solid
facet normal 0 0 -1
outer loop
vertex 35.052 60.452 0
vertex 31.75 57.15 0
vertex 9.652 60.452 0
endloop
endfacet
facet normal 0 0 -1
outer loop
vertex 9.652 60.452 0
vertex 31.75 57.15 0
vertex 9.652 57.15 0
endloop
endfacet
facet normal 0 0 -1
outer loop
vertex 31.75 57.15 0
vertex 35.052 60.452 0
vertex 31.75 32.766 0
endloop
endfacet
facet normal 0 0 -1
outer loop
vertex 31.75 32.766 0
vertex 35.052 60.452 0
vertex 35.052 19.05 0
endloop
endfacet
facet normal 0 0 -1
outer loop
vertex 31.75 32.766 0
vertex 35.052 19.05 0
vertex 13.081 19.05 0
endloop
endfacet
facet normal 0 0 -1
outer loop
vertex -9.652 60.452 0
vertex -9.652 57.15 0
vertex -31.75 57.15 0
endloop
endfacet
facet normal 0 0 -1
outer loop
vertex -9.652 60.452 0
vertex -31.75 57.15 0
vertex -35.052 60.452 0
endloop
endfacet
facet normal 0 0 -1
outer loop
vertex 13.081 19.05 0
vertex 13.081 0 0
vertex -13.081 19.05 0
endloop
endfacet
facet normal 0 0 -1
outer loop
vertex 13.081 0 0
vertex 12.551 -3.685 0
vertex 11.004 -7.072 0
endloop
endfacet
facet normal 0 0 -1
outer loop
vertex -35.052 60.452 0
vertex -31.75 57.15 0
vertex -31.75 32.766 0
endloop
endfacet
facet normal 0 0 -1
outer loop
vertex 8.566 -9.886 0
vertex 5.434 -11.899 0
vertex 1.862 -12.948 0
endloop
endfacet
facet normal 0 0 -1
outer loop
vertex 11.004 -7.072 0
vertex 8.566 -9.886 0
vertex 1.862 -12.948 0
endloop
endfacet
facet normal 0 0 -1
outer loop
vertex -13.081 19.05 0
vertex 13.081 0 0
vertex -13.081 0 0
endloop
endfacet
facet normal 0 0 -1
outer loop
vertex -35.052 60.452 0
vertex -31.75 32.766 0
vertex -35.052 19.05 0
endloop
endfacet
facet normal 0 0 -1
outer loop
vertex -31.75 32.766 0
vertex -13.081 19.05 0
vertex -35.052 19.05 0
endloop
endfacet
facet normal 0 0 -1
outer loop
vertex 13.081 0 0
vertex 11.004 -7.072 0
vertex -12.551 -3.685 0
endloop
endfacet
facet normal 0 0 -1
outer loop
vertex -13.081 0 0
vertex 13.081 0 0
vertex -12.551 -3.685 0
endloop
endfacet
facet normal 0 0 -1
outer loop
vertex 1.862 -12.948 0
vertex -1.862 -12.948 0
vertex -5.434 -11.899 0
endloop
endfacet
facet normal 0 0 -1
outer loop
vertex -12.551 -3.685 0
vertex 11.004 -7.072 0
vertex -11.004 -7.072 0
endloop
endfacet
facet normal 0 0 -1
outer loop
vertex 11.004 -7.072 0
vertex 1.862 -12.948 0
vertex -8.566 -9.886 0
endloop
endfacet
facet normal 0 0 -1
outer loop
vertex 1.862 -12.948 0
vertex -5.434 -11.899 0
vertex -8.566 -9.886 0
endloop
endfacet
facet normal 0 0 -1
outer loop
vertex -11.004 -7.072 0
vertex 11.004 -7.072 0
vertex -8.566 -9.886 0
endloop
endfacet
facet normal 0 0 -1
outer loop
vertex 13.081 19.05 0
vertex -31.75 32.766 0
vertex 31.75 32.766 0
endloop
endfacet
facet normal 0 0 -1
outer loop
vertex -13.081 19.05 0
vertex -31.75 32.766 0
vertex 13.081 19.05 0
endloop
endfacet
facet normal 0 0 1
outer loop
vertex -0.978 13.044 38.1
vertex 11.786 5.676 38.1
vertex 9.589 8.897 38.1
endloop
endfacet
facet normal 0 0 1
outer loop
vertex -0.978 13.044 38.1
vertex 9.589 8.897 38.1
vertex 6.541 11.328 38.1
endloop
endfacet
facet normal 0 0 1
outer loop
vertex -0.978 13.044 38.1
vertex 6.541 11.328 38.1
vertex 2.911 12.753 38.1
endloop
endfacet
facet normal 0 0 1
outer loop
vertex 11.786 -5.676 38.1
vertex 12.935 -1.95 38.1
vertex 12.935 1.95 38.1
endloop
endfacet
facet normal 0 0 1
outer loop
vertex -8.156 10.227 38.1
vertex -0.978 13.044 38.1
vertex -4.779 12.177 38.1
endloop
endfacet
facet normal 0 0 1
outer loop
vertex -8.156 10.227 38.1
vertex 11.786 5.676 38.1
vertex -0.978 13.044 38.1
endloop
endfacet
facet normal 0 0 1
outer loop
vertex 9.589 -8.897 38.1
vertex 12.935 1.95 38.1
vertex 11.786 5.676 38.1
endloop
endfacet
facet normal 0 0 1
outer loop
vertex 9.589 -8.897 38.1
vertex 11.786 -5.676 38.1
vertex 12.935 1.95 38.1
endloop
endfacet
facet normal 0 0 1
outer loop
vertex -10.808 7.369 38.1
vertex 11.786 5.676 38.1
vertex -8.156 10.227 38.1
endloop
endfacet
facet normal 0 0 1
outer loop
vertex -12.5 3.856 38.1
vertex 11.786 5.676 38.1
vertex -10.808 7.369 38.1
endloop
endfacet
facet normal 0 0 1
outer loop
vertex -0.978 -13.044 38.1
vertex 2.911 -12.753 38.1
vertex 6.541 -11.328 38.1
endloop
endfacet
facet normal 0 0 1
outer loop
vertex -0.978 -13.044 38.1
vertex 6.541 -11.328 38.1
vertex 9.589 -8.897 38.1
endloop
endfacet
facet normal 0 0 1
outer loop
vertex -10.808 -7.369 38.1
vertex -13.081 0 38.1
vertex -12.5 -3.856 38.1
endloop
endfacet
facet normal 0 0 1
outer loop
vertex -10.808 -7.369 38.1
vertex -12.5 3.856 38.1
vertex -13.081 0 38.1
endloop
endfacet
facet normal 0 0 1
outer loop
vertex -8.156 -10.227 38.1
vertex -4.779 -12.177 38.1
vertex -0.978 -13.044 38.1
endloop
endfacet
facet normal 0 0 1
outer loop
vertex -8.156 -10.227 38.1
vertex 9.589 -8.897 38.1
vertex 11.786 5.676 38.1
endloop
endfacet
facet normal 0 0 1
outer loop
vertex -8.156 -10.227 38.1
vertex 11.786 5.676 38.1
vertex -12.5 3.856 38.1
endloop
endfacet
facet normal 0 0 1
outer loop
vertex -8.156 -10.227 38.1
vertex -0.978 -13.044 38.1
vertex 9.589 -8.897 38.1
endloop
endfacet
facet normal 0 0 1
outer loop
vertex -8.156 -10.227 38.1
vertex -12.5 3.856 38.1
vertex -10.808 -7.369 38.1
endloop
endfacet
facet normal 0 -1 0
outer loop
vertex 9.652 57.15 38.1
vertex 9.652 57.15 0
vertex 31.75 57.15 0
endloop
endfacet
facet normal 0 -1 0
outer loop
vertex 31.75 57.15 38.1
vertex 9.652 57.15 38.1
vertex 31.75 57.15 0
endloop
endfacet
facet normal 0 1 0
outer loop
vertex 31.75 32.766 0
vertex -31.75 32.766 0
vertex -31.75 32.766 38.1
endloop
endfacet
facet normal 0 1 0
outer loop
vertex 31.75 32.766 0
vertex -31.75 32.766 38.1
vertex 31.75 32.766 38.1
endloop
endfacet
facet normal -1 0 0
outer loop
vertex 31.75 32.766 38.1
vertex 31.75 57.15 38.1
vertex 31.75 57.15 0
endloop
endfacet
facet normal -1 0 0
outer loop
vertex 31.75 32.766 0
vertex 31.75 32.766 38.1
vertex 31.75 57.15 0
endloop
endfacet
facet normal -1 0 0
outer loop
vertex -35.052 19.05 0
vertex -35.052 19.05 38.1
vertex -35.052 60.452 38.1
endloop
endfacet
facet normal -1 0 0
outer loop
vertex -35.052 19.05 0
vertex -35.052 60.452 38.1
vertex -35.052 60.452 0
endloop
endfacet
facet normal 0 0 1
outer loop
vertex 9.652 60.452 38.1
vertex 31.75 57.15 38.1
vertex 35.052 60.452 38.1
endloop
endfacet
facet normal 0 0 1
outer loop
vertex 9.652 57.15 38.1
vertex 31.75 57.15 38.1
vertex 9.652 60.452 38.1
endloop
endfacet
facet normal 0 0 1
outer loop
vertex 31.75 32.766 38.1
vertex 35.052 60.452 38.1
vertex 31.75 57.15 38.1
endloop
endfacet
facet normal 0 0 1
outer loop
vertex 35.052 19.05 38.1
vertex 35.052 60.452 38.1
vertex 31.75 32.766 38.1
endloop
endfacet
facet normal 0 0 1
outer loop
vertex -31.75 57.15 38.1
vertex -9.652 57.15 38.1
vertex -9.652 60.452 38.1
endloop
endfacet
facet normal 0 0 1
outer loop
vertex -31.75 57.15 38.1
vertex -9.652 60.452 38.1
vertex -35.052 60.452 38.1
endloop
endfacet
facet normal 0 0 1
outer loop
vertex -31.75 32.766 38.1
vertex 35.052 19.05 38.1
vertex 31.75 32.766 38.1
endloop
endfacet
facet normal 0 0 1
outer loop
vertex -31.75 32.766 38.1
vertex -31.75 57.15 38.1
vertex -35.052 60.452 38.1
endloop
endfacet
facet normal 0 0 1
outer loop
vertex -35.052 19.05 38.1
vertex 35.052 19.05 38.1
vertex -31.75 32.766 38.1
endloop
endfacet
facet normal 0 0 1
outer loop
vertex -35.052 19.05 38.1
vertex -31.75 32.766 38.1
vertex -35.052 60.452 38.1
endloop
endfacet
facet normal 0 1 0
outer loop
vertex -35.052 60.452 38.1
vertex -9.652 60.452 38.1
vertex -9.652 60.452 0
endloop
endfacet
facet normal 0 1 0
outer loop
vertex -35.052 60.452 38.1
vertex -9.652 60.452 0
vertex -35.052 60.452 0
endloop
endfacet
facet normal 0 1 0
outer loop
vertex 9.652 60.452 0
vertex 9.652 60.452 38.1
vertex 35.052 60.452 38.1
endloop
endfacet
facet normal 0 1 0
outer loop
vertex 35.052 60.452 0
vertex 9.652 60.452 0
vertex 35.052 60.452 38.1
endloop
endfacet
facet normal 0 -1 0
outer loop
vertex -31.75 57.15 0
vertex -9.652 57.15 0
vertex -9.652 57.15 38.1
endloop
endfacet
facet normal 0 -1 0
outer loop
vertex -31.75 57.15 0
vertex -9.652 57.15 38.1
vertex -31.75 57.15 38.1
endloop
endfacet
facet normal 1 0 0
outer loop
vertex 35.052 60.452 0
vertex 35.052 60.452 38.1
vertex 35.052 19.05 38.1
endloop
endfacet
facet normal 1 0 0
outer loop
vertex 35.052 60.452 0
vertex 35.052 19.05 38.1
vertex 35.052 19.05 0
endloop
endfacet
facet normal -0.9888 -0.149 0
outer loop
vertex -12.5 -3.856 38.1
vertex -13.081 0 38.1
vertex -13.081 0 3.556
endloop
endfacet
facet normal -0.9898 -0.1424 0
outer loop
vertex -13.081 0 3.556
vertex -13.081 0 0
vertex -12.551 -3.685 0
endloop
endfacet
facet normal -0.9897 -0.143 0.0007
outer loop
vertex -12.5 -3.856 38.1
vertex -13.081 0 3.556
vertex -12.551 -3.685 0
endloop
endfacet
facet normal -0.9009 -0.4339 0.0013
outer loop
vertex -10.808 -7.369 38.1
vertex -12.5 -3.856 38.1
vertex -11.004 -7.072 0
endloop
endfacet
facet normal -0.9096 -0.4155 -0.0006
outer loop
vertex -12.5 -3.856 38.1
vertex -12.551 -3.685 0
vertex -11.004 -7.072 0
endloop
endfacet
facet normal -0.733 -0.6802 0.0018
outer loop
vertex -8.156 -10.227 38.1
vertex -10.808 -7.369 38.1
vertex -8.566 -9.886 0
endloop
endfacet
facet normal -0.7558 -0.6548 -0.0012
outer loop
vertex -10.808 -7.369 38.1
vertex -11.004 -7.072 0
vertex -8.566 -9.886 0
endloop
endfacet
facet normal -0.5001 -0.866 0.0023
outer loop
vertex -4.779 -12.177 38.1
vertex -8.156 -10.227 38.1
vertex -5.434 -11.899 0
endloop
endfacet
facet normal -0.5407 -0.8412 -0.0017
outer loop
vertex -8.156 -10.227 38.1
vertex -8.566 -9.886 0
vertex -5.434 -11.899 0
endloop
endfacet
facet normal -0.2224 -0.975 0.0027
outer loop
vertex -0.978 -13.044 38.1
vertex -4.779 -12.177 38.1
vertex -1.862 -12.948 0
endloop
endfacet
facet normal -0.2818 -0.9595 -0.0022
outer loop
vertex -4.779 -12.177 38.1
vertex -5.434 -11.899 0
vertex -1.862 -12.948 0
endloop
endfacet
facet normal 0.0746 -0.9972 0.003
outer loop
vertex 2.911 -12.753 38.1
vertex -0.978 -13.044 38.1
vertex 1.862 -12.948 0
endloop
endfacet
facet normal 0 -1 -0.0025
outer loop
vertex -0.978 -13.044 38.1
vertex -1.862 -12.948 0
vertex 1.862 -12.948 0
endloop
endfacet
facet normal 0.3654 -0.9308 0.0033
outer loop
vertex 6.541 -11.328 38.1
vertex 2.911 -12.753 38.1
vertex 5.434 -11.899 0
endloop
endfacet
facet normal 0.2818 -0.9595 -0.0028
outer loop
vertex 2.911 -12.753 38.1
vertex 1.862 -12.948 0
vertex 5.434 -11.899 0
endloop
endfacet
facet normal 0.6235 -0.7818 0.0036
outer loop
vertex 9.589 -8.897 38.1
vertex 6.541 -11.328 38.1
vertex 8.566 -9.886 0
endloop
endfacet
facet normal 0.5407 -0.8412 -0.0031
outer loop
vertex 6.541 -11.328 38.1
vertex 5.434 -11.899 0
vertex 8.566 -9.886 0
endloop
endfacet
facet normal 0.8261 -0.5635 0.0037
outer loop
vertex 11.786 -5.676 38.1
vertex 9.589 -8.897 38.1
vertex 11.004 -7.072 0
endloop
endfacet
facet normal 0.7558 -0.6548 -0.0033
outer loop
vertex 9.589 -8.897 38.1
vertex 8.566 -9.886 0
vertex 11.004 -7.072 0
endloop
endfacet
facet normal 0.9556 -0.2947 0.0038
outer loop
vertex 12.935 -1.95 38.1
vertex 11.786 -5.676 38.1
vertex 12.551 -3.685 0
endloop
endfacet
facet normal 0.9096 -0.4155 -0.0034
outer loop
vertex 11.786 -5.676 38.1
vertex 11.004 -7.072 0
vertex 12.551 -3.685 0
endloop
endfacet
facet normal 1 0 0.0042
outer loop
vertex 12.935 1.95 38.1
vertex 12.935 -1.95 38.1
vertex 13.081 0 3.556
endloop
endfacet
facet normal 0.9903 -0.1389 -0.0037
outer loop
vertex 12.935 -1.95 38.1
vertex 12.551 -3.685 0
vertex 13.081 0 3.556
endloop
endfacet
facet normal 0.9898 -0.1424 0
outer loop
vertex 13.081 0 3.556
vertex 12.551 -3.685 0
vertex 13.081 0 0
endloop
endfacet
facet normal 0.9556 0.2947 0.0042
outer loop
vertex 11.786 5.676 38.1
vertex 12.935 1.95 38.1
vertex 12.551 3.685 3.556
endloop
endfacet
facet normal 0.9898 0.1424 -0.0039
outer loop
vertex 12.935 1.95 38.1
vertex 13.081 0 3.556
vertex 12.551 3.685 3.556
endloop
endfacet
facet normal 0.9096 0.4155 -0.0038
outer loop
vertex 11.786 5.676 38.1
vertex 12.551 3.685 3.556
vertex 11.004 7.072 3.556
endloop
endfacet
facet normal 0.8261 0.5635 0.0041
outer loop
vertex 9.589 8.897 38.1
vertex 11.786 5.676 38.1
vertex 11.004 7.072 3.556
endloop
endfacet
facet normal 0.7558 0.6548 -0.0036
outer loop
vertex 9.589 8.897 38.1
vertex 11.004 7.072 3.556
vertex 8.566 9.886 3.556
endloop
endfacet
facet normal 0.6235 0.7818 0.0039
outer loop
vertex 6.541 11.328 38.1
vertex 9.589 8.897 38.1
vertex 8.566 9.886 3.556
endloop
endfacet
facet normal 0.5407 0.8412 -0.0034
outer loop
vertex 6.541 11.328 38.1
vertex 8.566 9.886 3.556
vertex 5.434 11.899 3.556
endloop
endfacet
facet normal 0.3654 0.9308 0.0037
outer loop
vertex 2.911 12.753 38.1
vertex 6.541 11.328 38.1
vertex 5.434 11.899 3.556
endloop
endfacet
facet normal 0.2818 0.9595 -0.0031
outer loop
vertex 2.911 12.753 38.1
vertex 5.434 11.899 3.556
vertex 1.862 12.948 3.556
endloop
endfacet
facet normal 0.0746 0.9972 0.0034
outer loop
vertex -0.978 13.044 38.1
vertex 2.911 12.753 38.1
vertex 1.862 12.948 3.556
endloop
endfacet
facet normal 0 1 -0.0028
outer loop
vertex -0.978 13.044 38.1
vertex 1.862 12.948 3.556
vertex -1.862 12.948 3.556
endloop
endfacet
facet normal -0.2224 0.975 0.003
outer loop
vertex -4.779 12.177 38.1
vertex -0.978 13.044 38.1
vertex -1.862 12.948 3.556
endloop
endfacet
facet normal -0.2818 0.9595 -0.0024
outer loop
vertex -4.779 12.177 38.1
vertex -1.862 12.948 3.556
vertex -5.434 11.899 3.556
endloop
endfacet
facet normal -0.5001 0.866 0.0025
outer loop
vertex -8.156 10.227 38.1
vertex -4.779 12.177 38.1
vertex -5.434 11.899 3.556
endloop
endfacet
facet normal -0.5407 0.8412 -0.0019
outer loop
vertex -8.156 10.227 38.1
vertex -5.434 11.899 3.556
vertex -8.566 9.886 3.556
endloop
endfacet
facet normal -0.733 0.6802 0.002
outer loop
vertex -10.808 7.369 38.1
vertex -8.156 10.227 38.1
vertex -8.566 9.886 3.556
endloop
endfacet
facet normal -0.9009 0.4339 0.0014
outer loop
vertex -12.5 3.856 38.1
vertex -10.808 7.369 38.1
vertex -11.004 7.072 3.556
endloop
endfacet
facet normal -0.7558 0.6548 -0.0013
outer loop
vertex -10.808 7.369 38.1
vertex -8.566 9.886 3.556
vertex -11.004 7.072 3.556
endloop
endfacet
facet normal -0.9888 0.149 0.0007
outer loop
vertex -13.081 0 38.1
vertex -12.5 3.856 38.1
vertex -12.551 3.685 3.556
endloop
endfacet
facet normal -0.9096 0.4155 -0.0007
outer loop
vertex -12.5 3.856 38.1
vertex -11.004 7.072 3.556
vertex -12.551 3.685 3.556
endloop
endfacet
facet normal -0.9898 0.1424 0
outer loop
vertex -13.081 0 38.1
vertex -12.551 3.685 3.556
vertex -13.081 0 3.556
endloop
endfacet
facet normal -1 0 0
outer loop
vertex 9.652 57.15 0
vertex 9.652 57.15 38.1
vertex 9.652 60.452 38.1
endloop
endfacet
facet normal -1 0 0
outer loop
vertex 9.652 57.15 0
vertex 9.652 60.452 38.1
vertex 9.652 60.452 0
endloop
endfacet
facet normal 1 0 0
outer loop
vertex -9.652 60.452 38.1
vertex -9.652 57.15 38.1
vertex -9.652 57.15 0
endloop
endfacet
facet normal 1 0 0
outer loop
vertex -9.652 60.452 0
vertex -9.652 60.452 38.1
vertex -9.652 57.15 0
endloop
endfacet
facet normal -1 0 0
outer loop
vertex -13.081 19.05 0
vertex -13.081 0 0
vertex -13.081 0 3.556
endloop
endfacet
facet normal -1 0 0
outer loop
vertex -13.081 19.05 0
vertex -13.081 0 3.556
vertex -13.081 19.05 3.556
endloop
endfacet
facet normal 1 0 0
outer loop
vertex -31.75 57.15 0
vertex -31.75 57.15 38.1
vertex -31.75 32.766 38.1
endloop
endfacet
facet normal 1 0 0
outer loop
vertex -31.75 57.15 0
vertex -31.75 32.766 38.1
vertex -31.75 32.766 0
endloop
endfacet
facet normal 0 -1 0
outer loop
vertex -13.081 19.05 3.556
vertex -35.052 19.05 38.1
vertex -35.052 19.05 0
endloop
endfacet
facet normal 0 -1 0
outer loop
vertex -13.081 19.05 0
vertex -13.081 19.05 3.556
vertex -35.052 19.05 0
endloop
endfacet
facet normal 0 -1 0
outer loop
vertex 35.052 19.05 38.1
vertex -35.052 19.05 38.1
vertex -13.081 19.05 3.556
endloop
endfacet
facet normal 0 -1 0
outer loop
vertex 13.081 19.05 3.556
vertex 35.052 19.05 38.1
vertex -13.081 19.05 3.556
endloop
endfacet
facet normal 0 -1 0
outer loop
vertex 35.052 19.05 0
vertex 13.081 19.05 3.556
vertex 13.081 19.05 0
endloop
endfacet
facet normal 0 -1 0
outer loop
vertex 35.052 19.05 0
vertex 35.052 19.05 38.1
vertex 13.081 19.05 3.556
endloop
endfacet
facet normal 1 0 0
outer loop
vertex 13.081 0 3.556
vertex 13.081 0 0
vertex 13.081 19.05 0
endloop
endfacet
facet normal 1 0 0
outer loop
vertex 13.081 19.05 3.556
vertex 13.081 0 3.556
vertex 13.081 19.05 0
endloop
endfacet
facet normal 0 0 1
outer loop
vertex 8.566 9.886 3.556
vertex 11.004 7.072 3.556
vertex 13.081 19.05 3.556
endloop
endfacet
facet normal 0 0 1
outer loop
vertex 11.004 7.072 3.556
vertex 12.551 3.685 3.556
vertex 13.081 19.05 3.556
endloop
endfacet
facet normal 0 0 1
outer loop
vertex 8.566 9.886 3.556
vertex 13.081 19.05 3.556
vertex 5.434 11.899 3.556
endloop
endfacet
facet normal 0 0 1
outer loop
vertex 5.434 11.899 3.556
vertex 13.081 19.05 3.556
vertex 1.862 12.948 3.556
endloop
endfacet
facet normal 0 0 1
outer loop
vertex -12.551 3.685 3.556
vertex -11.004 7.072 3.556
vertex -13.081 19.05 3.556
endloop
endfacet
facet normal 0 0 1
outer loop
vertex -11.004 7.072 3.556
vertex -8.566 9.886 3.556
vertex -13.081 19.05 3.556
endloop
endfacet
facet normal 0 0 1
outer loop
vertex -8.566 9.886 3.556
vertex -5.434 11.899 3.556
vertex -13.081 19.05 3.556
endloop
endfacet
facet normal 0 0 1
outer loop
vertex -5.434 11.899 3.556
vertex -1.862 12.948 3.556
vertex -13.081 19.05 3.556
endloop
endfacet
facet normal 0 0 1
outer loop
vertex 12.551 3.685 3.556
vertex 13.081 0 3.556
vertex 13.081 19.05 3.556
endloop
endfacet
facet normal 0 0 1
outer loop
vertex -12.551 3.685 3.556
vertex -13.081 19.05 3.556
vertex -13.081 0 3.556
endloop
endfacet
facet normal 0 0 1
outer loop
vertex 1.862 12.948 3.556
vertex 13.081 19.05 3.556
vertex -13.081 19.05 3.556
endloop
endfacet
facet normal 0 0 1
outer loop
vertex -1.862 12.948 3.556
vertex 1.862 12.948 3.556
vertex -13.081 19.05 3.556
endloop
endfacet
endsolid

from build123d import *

# Parameters (mm, degrees)
SKETCH1_R           = 13.081
BOSS_EXTRUDE1_DEPTH = 38.1
SKETCH2_W           = 26.162
SKETCH2_H           = 19.05
BOSS_EXTRUDE2_DEPTH = 3.556
SKETCH4_W           = 63.5
SKETCH4_H           = 38.1
BOSS_EXTRUDE3_DEPTH = 13.716
SKETCH6_W           = 38.1
SKETCH6_H           = 38.1
BOSS_EXTRUDE4_DEPTH = 3.302
SKETCH7_W           = 25.4
SKETCH7_H           = 38.1
BOSS_EXTRUDE5_DEPTH = 3.302


with BuildPart() as part:
    # Sketch1 → Boss-Extrude1 (new body)
    with BuildSketch(Plane.XY):
        Circle(SKETCH1_R)
    extrude(amount=BOSS_EXTRUDE1_DEPTH)

    # Sketch2 → Boss-Extrude2 (add)
    with BuildSketch(Plane(origin=(0, 0, 0), x_dir=(-1, 0, 0), z_dir=(0, 0, -1))):
        with Locations((0, 9.525)):
            Rectangle(SKETCH2_W, SKETCH2_H)
    extrude(amount=-BOSS_EXTRUDE2_DEPTH)

    # Sketch4 → Boss-Extrude3 (add)
    with BuildSketch(Plane(origin=(0, 19.05, 0), x_dir=(1, 0, 0), z_dir=(0, 1, 0))):
        with Locations((0, -19.05)):
            Rectangle(SKETCH4_W, SKETCH4_H)
    extrude(amount=BOSS_EXTRUDE3_DEPTH)

    # Sketch6 → Boss-Extrude4 (add)
    with BuildSketch(Plane(origin=(31.75, 0, 0), x_dir=(0, 0, -1), z_dir=(1, 0, 0))):
        with Locations((-19.05, 38.1)):
            Rectangle(SKETCH6_W, SKETCH6_H)
    boss_extrude4 = extrude(amount=BOSS_EXTRUDE4_DEPTH)

    # Mirror1: Boss-Extrude4 across plane
    add(boss_extrude4.mirror(Plane(origin=(0, 0, 0), x_dir=(0, 0, 1), z_dir=(1, 0, 0))))

    # Sketch7 → Boss-Extrude5 (add)
    with BuildSketch(Plane(origin=(0, 57.15, 0), x_dir=(1, 0, 0), z_dir=(0, 1, 0))):
        with Locations((22.352, -19.05)):
            Rectangle(SKETCH7_W, SKETCH7_H)
    boss_extrude5 = extrude(amount=BOSS_EXTRUDE5_DEPTH)

    # Mirror2: Boss-Extrude5 across plane
    add(boss_extrude5.mirror(Plane(origin=(0, 0, 0), x_dir=(0, 0, 1), z_dir=(1, 0, 0))))


solid = part.part
